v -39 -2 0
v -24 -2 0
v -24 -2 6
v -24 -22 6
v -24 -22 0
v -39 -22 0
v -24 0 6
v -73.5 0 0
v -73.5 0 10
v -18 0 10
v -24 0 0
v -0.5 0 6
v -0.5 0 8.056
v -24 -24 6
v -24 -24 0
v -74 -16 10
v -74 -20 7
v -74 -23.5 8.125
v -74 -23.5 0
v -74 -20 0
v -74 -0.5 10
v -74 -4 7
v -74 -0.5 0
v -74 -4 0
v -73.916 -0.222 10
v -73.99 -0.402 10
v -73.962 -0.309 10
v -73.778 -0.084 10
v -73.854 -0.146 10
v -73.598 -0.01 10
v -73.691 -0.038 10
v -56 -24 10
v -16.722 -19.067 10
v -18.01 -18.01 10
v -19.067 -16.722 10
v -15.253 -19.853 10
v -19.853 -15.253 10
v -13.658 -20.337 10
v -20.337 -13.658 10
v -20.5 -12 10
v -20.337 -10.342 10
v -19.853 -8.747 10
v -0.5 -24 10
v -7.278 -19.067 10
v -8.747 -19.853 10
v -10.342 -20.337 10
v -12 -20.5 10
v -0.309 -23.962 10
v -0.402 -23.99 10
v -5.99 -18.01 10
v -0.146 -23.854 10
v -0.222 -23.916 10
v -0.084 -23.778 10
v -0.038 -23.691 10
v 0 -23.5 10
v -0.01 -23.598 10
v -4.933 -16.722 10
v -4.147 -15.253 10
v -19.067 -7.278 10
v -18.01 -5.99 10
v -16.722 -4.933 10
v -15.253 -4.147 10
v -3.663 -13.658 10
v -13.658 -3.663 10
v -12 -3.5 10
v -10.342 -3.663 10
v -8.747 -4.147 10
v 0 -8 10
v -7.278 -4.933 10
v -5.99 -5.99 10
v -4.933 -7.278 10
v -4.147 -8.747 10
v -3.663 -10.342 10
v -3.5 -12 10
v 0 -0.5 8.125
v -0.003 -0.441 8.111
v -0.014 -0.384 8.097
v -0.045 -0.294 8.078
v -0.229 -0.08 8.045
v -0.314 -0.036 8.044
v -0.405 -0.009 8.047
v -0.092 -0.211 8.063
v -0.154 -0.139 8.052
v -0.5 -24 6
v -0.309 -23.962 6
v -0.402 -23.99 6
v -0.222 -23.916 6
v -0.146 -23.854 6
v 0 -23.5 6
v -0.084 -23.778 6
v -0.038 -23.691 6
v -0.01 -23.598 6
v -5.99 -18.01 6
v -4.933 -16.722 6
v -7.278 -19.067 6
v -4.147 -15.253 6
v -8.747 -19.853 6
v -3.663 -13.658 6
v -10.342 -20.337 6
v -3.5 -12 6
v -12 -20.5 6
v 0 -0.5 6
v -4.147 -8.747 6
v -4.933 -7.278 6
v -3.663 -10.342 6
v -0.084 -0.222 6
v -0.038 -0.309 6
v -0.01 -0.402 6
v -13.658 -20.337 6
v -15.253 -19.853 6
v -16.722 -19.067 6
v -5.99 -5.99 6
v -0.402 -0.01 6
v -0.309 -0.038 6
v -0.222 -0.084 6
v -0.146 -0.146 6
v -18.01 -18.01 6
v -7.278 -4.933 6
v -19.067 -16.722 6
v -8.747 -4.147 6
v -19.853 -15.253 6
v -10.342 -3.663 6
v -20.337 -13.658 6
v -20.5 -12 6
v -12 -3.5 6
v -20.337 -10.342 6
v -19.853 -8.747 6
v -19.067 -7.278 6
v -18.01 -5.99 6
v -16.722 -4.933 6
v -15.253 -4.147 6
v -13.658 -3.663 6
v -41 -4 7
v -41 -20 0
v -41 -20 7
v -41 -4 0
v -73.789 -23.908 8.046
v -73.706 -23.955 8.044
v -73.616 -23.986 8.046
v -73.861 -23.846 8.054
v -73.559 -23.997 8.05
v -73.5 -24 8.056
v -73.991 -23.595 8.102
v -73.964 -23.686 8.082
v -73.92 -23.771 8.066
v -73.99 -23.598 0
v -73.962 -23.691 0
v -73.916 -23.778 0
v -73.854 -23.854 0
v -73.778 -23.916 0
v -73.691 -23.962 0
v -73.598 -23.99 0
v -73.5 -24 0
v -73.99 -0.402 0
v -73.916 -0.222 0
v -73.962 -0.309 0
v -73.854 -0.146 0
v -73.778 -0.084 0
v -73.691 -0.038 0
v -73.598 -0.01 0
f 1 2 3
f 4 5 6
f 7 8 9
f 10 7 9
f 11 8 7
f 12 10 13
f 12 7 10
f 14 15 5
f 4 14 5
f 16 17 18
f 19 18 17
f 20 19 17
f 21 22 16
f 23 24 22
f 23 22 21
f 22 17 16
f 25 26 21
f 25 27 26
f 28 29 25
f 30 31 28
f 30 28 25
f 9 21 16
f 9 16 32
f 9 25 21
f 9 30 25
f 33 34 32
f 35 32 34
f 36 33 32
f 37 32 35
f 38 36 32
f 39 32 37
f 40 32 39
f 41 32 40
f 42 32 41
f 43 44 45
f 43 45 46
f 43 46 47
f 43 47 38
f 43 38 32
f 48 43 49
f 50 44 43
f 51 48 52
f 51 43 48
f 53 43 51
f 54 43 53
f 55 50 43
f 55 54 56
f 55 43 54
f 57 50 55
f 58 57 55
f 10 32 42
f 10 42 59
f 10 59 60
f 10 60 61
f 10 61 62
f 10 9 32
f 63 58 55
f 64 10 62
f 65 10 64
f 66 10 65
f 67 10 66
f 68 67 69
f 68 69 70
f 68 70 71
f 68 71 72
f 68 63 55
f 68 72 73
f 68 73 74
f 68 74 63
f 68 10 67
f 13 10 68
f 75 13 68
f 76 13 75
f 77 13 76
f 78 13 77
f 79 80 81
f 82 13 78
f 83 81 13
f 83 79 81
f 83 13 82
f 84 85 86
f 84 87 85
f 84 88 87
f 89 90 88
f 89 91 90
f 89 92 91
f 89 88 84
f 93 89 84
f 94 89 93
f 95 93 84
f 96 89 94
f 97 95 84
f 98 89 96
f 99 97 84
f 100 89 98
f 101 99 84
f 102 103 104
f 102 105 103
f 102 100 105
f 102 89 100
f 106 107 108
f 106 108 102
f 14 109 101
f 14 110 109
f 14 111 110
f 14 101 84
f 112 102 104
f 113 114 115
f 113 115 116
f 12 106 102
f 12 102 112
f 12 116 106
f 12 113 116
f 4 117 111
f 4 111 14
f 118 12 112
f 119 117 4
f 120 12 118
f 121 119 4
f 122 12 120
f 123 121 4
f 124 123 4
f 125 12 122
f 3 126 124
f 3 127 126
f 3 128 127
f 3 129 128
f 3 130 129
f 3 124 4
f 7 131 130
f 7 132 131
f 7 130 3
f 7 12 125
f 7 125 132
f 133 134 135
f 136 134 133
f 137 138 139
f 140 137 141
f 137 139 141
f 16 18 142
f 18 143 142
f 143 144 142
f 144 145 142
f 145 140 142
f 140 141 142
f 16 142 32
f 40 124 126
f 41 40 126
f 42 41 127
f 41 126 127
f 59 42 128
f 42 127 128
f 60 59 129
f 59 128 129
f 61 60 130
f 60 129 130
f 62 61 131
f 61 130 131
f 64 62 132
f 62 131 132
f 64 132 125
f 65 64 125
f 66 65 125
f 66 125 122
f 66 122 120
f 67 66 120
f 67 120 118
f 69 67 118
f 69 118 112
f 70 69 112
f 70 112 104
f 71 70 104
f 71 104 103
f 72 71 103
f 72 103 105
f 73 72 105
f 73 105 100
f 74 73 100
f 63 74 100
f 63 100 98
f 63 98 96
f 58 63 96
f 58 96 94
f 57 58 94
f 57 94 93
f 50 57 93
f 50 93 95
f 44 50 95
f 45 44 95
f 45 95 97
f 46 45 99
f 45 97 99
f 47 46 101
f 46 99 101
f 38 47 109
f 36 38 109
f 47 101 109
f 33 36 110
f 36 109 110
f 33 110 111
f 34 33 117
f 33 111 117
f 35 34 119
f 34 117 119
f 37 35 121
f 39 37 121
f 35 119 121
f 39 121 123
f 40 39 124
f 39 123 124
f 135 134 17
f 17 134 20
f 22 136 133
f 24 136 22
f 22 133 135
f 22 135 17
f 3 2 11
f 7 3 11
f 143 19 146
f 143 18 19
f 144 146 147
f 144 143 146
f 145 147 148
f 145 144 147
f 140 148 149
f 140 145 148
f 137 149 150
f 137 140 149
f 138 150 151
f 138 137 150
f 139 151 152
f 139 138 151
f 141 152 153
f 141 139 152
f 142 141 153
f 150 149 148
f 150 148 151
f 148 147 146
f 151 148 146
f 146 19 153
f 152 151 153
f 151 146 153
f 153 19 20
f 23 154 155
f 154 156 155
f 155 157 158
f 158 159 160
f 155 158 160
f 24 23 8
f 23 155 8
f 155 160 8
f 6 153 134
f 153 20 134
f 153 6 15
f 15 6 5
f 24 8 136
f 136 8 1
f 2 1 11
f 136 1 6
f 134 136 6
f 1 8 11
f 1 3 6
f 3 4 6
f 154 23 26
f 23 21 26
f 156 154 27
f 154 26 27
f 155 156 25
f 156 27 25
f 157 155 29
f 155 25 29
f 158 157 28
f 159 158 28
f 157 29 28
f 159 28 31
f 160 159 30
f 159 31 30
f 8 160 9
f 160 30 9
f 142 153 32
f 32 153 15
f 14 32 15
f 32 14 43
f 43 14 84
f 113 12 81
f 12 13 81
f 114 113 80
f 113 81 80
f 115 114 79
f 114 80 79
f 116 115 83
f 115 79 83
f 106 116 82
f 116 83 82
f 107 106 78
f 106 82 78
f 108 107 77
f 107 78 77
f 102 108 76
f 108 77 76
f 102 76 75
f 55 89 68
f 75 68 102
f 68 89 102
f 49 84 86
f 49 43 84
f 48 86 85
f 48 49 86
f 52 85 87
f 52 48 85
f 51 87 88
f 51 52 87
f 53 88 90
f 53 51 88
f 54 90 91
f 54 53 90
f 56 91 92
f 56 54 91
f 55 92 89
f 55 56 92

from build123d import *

# Parameters (mm, degrees)
SKETCH_1_W          = 74
SKETCH_1_H          = 24
EXTRUDE_1_DEPTH     = 10
CHAMFER_START       = 7.716439039
CHAMFER_1_OUTLINE_W = 21
CHAMFER_1_OUTLINE_H = 12
CHAMFER_1_DEPTH     = 3.283560961
SKETCH_2_R          = 8.5
CUT_EXTRUDE_1_DEPTH = 10
SKETCH_3_W          = 24
SKETCH_3_H          = 24
CUT_EXTRUDE_2_DEPTH = 6
CHAMFER_START_2     = -24
CHAMFER_3_OUTLINE_W = 21
CHAMFER_3_OUTLINE_H = 11
CHAMFER_3_DEPTH     = 2.565447114
FILLET_1_R          = 0.5
CUT_EXTRUDE_3_DEPTH = 10
SKETCH_5_W          = 33
SKETCH_5_H          = 16
CUT_EXTRUDE_4_DEPTH = 7


with BuildPart() as part:
    # 草图1 → 凸台-拉伸1 (new body)
    with BuildSketch(Plane.XY):
        with Locations((-37, -12)):
            Rectangle(SKETCH_1_W, SKETCH_1_H)
    extrude(amount=EXTRUDE_1_DEPTH)

    # 倒角1: read off the stored shape, not the designer's step
    # 倒角1 outline → 倒角1 (cut)
    with BuildSketch(Plane(origin=(0, 0, 0), x_dir=(0.994240412860114, -0.02599321340810768, -0.1039728536324305), z_dir=(0.10717276443084896, 0.24113871996940994, 0.9645548798776378)).offset(CHAMFER_START)):
        with Locations((-9.5, -6)):
            Rectangle(CHAMFER_1_OUTLINE_W, CHAMFER_1_OUTLINE_H)
    extrude(amount=CHAMFER_1_DEPTH, mode=Mode.SUBTRACT)

    # 草图2 → 切除-拉伸1 (cut)
    with BuildSketch(Plane(origin=(0, 0, 0), x_dir=(-1, 0, 0), z_dir=(0, 0, -1))):
        with Locations((12, -12)):
            Circle(SKETCH_2_R)
    extrude(amount=-CUT_EXTRUDE_1_DEPTH, mode=Mode.SUBTRACT)

    # 草图3 → 切除-拉伸2 (cut)
    with BuildSketch(Plane(origin=(0, 0, 0), x_dir=(-1, 0, 0), z_dir=(0, 0, -1))):
        with Locations((12, -12)):
            Rectangle(SKETCH_3_W, SKETCH_3_H)
    extrude(amount=-CUT_EXTRUDE_2_DEPTH, mode=Mode.SUBTRACT)

    # 倒角3: read off the stored shape, not the designer's step
    # 倒角3 outline → 倒角3 (cut)
    with BuildSketch(Plane(origin=(0, 0, 0), x_dir=(0.994240412860114, -0.02599321340810768, 0.1039728536324305), z_dir=(0.10717276443084896, 0.24113871996940994, -0.9645548798776378)).offset(CHAMFER_START_2)):
        with Locations((-63.5, 17.5)):
            Rectangle(CHAMFER_3_OUTLINE_W, CHAMFER_3_OUTLINE_H)
    extrude(amount=CHAMFER_3_DEPTH, mode=Mode.SUBTRACT)

    # 圆角1
    fillet_1_edges = [part.edges().sort_by_distance(p)[0] for p in [
        (0, 0, 7),
        (-74, -24, 4),
        (0, -24, 8),
        (-74, 0, 5),
    ]]
    fillet(fillet_1_edges, radius=FILLET_1_R)

    # 草图4 → 切除-拉伸3 (cut, symmetric)
    with BuildSketch(Plane(origin=(0, -12, 0), x_dir=(-1, 0, 0), z_dir=(0, -1, 0))):
        Polygon((24, -6), (39, 0), (24, 0), align=None)
    extrude(amount=CUT_EXTRUDE_3_DEPTH, both=True, mode=Mode.SUBTRACT)

    # 草图5 → 切除-拉伸4 (cut)
    with BuildSketch(Plane(origin=(0, 0, 0), x_dir=(-1, 0, 0), z_dir=(0, 0, -1))):
        with Locations((57.5, -12)):
            Rectangle(SKETCH_5_W, SKETCH_5_H)
    extrude(amount=-CUT_EXTRUDE_4_DEPTH, mode=Mode.SUBTRACT)


solid = part.part
